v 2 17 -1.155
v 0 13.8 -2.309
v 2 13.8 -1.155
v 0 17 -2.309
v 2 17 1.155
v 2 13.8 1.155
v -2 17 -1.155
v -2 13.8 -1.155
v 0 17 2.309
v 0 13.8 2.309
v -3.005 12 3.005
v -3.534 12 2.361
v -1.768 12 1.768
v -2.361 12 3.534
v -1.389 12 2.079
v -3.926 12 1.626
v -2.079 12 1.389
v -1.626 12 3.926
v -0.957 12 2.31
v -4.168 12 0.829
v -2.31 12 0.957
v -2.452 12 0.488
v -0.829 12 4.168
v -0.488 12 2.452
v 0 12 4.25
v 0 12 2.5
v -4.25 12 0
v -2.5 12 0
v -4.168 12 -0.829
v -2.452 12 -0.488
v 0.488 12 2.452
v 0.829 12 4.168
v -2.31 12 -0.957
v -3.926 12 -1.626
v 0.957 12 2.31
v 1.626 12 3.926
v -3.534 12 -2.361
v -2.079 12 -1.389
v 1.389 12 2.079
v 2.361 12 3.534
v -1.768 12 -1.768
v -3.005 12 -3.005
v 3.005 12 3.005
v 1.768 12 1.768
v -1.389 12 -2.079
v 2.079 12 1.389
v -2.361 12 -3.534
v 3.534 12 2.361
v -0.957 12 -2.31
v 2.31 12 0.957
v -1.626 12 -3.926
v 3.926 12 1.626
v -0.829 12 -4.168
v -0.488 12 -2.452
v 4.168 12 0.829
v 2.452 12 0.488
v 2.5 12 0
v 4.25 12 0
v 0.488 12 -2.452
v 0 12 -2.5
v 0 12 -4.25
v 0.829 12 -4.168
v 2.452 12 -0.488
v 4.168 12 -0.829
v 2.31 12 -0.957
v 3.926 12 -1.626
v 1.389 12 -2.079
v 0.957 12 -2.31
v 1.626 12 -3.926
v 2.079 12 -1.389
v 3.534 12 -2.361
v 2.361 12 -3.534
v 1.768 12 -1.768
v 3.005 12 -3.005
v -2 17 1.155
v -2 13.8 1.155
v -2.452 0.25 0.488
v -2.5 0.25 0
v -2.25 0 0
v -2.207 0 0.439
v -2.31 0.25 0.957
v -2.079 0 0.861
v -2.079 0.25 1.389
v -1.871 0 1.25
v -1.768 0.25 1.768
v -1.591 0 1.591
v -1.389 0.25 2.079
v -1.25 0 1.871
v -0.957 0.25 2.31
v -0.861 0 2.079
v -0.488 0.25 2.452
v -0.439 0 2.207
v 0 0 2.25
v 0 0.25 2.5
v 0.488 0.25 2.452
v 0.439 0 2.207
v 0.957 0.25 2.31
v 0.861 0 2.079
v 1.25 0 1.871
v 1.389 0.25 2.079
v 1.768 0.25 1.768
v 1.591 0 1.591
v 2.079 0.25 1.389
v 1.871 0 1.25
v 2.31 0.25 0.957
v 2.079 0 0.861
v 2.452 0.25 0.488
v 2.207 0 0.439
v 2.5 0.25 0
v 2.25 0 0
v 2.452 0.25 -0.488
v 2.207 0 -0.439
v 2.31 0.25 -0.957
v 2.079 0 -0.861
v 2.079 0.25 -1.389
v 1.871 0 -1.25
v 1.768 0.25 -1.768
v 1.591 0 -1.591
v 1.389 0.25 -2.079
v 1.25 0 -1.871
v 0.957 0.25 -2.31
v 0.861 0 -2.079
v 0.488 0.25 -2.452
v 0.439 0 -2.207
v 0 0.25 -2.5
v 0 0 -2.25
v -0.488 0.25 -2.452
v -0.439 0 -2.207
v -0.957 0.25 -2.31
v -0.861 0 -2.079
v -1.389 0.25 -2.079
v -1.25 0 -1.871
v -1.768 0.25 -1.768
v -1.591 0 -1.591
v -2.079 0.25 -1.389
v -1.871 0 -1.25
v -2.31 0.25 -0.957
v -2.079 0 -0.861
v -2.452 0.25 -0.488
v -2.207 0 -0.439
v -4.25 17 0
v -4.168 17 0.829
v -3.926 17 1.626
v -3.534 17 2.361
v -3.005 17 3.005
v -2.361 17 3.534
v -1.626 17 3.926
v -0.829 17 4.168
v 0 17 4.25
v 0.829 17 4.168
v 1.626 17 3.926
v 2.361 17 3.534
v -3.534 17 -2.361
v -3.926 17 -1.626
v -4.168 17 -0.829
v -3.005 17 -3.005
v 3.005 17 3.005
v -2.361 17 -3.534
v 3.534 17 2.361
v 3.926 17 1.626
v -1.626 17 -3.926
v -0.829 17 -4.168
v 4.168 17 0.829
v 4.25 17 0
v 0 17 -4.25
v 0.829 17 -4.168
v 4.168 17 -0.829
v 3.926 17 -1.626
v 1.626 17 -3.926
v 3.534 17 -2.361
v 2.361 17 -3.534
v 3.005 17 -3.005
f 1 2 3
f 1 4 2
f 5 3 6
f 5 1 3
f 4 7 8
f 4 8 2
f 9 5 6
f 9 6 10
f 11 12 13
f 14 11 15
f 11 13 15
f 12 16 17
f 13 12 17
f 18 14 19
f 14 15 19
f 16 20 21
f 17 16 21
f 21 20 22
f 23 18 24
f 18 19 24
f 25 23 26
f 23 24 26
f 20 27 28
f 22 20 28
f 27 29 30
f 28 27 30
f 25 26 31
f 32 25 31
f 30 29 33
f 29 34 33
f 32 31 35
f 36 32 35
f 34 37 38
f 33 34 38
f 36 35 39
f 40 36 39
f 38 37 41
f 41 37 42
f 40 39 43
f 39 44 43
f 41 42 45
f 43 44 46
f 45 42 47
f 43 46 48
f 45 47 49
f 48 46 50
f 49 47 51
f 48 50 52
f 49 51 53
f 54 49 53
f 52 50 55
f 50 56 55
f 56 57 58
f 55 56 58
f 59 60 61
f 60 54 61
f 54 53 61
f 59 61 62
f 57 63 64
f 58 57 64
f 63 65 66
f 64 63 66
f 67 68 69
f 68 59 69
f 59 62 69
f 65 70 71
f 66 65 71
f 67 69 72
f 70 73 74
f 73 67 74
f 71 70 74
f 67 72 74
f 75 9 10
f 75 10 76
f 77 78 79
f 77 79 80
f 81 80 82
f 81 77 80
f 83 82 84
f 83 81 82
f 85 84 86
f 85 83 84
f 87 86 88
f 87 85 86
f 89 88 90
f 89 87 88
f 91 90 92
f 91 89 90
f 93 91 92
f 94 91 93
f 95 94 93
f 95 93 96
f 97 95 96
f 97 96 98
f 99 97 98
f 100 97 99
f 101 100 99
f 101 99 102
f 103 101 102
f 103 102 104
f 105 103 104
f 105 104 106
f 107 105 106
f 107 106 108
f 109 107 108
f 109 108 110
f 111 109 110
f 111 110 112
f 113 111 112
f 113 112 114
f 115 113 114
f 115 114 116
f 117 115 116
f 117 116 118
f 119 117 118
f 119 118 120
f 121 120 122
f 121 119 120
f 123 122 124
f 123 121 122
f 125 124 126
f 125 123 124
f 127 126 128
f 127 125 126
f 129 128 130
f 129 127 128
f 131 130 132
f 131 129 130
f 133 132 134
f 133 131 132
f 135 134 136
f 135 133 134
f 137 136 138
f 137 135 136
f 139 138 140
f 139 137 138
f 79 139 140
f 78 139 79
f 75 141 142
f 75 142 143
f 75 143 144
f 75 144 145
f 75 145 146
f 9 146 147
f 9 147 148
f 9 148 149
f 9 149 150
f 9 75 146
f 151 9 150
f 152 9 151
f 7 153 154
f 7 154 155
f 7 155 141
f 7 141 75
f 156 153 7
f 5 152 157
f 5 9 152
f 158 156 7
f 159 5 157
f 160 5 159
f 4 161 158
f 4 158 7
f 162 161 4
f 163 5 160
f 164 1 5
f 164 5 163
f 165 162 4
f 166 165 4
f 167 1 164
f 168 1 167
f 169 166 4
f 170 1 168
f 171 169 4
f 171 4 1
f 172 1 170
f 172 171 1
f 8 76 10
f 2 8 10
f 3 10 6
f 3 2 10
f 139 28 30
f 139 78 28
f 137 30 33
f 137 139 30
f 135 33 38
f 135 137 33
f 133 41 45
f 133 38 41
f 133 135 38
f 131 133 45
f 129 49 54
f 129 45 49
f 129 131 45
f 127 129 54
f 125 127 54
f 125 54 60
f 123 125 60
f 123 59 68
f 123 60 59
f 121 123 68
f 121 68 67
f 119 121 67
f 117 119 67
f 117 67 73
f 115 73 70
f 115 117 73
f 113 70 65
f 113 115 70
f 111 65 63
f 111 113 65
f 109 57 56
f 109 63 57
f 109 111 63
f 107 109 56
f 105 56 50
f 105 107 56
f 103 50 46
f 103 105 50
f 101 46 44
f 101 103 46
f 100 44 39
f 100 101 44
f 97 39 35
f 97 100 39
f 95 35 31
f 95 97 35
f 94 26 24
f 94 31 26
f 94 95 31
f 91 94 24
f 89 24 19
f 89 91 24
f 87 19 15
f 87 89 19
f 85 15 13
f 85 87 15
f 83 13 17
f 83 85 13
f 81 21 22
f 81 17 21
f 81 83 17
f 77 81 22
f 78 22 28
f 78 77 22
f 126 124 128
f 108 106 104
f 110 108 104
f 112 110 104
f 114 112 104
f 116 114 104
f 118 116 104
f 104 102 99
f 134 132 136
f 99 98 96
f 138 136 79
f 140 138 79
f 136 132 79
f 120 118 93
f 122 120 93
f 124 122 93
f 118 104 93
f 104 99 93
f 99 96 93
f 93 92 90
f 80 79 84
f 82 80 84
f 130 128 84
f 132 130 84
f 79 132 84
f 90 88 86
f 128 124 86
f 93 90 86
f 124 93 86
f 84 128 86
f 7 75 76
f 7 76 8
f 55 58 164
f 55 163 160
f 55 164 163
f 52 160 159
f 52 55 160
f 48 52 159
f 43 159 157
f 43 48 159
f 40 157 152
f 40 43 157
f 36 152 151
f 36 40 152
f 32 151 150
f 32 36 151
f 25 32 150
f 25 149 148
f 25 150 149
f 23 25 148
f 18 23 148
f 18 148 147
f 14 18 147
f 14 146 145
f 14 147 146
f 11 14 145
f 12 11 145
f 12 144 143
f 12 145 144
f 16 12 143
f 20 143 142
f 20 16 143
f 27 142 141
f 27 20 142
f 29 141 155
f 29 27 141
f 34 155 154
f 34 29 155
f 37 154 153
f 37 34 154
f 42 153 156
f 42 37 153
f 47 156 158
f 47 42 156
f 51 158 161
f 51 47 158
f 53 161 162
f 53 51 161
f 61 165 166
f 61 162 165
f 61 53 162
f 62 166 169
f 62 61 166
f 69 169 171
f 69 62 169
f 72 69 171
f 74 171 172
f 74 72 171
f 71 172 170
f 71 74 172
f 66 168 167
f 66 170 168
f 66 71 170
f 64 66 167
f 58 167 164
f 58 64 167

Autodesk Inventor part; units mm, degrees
ref_plane "YZ Plane" through (0, 0, 0) normal (1, 0, 0) x (0, 1, 0)
ref_plane "XZ Plane" through (0, 0, 0) normal (0, 1, 0) x (-1, 0, 0)
ref_plane "XY Plane" through (0, 0, 0) normal (0, 0, 1) x (1, 0, 0)
sketch "Sketch1" plane through (0, 0, 0) normal (0, 1, 0) x (-1, 0, 0)
  circle A0 centre (0, 0) radius 2.5
  dimension "d0" = 5
extrude "Extrusion1" add sketch "Sketch1" along normal blind 12
sketch "Sketch2" plane through (0, 12, 0) normal (0, 1, 0) x (1, 0, 0)
  circle A0 centre (0, 0) radius 2.5 projected
  circle A1 centre (0, 0) radius 4.25
  dimension "d3" = 8.5
extrude "Extrusion2" add sketch "Sketch2" along normal blind 5 contours A0 | A1
sketch "Sketch3" plane through (0, 17, 0) normal (0, 1, 0) x (1, 0, 0)
  circle A0 centre (0, 0) radius 4.25 projected
  line L0 (0, 2.3094) -> (2, 1.1547)
  line L1 (2, 1.1547) -> (2, -1.1547)
  line L2 (2, -1.1547) -> (0, -2.3094)
  line L3 (0, -2.3094) -> (-2, -1.1547)
  line L4 (-2, -1.1547) -> (-2, 1.1547)
  line L5 (-2, 1.1547) -> (0, 2.3094)
  dimension "d6" = 2
extrude "Extrusion3" cut sketch "Sketch3" against normal blind 3.2 contours L0 L1 L2 L3 L4 L5
thread "Thread1" size "M5x0.8" class "6g" standard "ANSI Metric M Profile" full length
chamfer "Chamfer1" distance 0.25 angle 45 1 edges at (2.5, 0, 0)
properties part number "M5x12SHCS" material "Stainless Steel"
